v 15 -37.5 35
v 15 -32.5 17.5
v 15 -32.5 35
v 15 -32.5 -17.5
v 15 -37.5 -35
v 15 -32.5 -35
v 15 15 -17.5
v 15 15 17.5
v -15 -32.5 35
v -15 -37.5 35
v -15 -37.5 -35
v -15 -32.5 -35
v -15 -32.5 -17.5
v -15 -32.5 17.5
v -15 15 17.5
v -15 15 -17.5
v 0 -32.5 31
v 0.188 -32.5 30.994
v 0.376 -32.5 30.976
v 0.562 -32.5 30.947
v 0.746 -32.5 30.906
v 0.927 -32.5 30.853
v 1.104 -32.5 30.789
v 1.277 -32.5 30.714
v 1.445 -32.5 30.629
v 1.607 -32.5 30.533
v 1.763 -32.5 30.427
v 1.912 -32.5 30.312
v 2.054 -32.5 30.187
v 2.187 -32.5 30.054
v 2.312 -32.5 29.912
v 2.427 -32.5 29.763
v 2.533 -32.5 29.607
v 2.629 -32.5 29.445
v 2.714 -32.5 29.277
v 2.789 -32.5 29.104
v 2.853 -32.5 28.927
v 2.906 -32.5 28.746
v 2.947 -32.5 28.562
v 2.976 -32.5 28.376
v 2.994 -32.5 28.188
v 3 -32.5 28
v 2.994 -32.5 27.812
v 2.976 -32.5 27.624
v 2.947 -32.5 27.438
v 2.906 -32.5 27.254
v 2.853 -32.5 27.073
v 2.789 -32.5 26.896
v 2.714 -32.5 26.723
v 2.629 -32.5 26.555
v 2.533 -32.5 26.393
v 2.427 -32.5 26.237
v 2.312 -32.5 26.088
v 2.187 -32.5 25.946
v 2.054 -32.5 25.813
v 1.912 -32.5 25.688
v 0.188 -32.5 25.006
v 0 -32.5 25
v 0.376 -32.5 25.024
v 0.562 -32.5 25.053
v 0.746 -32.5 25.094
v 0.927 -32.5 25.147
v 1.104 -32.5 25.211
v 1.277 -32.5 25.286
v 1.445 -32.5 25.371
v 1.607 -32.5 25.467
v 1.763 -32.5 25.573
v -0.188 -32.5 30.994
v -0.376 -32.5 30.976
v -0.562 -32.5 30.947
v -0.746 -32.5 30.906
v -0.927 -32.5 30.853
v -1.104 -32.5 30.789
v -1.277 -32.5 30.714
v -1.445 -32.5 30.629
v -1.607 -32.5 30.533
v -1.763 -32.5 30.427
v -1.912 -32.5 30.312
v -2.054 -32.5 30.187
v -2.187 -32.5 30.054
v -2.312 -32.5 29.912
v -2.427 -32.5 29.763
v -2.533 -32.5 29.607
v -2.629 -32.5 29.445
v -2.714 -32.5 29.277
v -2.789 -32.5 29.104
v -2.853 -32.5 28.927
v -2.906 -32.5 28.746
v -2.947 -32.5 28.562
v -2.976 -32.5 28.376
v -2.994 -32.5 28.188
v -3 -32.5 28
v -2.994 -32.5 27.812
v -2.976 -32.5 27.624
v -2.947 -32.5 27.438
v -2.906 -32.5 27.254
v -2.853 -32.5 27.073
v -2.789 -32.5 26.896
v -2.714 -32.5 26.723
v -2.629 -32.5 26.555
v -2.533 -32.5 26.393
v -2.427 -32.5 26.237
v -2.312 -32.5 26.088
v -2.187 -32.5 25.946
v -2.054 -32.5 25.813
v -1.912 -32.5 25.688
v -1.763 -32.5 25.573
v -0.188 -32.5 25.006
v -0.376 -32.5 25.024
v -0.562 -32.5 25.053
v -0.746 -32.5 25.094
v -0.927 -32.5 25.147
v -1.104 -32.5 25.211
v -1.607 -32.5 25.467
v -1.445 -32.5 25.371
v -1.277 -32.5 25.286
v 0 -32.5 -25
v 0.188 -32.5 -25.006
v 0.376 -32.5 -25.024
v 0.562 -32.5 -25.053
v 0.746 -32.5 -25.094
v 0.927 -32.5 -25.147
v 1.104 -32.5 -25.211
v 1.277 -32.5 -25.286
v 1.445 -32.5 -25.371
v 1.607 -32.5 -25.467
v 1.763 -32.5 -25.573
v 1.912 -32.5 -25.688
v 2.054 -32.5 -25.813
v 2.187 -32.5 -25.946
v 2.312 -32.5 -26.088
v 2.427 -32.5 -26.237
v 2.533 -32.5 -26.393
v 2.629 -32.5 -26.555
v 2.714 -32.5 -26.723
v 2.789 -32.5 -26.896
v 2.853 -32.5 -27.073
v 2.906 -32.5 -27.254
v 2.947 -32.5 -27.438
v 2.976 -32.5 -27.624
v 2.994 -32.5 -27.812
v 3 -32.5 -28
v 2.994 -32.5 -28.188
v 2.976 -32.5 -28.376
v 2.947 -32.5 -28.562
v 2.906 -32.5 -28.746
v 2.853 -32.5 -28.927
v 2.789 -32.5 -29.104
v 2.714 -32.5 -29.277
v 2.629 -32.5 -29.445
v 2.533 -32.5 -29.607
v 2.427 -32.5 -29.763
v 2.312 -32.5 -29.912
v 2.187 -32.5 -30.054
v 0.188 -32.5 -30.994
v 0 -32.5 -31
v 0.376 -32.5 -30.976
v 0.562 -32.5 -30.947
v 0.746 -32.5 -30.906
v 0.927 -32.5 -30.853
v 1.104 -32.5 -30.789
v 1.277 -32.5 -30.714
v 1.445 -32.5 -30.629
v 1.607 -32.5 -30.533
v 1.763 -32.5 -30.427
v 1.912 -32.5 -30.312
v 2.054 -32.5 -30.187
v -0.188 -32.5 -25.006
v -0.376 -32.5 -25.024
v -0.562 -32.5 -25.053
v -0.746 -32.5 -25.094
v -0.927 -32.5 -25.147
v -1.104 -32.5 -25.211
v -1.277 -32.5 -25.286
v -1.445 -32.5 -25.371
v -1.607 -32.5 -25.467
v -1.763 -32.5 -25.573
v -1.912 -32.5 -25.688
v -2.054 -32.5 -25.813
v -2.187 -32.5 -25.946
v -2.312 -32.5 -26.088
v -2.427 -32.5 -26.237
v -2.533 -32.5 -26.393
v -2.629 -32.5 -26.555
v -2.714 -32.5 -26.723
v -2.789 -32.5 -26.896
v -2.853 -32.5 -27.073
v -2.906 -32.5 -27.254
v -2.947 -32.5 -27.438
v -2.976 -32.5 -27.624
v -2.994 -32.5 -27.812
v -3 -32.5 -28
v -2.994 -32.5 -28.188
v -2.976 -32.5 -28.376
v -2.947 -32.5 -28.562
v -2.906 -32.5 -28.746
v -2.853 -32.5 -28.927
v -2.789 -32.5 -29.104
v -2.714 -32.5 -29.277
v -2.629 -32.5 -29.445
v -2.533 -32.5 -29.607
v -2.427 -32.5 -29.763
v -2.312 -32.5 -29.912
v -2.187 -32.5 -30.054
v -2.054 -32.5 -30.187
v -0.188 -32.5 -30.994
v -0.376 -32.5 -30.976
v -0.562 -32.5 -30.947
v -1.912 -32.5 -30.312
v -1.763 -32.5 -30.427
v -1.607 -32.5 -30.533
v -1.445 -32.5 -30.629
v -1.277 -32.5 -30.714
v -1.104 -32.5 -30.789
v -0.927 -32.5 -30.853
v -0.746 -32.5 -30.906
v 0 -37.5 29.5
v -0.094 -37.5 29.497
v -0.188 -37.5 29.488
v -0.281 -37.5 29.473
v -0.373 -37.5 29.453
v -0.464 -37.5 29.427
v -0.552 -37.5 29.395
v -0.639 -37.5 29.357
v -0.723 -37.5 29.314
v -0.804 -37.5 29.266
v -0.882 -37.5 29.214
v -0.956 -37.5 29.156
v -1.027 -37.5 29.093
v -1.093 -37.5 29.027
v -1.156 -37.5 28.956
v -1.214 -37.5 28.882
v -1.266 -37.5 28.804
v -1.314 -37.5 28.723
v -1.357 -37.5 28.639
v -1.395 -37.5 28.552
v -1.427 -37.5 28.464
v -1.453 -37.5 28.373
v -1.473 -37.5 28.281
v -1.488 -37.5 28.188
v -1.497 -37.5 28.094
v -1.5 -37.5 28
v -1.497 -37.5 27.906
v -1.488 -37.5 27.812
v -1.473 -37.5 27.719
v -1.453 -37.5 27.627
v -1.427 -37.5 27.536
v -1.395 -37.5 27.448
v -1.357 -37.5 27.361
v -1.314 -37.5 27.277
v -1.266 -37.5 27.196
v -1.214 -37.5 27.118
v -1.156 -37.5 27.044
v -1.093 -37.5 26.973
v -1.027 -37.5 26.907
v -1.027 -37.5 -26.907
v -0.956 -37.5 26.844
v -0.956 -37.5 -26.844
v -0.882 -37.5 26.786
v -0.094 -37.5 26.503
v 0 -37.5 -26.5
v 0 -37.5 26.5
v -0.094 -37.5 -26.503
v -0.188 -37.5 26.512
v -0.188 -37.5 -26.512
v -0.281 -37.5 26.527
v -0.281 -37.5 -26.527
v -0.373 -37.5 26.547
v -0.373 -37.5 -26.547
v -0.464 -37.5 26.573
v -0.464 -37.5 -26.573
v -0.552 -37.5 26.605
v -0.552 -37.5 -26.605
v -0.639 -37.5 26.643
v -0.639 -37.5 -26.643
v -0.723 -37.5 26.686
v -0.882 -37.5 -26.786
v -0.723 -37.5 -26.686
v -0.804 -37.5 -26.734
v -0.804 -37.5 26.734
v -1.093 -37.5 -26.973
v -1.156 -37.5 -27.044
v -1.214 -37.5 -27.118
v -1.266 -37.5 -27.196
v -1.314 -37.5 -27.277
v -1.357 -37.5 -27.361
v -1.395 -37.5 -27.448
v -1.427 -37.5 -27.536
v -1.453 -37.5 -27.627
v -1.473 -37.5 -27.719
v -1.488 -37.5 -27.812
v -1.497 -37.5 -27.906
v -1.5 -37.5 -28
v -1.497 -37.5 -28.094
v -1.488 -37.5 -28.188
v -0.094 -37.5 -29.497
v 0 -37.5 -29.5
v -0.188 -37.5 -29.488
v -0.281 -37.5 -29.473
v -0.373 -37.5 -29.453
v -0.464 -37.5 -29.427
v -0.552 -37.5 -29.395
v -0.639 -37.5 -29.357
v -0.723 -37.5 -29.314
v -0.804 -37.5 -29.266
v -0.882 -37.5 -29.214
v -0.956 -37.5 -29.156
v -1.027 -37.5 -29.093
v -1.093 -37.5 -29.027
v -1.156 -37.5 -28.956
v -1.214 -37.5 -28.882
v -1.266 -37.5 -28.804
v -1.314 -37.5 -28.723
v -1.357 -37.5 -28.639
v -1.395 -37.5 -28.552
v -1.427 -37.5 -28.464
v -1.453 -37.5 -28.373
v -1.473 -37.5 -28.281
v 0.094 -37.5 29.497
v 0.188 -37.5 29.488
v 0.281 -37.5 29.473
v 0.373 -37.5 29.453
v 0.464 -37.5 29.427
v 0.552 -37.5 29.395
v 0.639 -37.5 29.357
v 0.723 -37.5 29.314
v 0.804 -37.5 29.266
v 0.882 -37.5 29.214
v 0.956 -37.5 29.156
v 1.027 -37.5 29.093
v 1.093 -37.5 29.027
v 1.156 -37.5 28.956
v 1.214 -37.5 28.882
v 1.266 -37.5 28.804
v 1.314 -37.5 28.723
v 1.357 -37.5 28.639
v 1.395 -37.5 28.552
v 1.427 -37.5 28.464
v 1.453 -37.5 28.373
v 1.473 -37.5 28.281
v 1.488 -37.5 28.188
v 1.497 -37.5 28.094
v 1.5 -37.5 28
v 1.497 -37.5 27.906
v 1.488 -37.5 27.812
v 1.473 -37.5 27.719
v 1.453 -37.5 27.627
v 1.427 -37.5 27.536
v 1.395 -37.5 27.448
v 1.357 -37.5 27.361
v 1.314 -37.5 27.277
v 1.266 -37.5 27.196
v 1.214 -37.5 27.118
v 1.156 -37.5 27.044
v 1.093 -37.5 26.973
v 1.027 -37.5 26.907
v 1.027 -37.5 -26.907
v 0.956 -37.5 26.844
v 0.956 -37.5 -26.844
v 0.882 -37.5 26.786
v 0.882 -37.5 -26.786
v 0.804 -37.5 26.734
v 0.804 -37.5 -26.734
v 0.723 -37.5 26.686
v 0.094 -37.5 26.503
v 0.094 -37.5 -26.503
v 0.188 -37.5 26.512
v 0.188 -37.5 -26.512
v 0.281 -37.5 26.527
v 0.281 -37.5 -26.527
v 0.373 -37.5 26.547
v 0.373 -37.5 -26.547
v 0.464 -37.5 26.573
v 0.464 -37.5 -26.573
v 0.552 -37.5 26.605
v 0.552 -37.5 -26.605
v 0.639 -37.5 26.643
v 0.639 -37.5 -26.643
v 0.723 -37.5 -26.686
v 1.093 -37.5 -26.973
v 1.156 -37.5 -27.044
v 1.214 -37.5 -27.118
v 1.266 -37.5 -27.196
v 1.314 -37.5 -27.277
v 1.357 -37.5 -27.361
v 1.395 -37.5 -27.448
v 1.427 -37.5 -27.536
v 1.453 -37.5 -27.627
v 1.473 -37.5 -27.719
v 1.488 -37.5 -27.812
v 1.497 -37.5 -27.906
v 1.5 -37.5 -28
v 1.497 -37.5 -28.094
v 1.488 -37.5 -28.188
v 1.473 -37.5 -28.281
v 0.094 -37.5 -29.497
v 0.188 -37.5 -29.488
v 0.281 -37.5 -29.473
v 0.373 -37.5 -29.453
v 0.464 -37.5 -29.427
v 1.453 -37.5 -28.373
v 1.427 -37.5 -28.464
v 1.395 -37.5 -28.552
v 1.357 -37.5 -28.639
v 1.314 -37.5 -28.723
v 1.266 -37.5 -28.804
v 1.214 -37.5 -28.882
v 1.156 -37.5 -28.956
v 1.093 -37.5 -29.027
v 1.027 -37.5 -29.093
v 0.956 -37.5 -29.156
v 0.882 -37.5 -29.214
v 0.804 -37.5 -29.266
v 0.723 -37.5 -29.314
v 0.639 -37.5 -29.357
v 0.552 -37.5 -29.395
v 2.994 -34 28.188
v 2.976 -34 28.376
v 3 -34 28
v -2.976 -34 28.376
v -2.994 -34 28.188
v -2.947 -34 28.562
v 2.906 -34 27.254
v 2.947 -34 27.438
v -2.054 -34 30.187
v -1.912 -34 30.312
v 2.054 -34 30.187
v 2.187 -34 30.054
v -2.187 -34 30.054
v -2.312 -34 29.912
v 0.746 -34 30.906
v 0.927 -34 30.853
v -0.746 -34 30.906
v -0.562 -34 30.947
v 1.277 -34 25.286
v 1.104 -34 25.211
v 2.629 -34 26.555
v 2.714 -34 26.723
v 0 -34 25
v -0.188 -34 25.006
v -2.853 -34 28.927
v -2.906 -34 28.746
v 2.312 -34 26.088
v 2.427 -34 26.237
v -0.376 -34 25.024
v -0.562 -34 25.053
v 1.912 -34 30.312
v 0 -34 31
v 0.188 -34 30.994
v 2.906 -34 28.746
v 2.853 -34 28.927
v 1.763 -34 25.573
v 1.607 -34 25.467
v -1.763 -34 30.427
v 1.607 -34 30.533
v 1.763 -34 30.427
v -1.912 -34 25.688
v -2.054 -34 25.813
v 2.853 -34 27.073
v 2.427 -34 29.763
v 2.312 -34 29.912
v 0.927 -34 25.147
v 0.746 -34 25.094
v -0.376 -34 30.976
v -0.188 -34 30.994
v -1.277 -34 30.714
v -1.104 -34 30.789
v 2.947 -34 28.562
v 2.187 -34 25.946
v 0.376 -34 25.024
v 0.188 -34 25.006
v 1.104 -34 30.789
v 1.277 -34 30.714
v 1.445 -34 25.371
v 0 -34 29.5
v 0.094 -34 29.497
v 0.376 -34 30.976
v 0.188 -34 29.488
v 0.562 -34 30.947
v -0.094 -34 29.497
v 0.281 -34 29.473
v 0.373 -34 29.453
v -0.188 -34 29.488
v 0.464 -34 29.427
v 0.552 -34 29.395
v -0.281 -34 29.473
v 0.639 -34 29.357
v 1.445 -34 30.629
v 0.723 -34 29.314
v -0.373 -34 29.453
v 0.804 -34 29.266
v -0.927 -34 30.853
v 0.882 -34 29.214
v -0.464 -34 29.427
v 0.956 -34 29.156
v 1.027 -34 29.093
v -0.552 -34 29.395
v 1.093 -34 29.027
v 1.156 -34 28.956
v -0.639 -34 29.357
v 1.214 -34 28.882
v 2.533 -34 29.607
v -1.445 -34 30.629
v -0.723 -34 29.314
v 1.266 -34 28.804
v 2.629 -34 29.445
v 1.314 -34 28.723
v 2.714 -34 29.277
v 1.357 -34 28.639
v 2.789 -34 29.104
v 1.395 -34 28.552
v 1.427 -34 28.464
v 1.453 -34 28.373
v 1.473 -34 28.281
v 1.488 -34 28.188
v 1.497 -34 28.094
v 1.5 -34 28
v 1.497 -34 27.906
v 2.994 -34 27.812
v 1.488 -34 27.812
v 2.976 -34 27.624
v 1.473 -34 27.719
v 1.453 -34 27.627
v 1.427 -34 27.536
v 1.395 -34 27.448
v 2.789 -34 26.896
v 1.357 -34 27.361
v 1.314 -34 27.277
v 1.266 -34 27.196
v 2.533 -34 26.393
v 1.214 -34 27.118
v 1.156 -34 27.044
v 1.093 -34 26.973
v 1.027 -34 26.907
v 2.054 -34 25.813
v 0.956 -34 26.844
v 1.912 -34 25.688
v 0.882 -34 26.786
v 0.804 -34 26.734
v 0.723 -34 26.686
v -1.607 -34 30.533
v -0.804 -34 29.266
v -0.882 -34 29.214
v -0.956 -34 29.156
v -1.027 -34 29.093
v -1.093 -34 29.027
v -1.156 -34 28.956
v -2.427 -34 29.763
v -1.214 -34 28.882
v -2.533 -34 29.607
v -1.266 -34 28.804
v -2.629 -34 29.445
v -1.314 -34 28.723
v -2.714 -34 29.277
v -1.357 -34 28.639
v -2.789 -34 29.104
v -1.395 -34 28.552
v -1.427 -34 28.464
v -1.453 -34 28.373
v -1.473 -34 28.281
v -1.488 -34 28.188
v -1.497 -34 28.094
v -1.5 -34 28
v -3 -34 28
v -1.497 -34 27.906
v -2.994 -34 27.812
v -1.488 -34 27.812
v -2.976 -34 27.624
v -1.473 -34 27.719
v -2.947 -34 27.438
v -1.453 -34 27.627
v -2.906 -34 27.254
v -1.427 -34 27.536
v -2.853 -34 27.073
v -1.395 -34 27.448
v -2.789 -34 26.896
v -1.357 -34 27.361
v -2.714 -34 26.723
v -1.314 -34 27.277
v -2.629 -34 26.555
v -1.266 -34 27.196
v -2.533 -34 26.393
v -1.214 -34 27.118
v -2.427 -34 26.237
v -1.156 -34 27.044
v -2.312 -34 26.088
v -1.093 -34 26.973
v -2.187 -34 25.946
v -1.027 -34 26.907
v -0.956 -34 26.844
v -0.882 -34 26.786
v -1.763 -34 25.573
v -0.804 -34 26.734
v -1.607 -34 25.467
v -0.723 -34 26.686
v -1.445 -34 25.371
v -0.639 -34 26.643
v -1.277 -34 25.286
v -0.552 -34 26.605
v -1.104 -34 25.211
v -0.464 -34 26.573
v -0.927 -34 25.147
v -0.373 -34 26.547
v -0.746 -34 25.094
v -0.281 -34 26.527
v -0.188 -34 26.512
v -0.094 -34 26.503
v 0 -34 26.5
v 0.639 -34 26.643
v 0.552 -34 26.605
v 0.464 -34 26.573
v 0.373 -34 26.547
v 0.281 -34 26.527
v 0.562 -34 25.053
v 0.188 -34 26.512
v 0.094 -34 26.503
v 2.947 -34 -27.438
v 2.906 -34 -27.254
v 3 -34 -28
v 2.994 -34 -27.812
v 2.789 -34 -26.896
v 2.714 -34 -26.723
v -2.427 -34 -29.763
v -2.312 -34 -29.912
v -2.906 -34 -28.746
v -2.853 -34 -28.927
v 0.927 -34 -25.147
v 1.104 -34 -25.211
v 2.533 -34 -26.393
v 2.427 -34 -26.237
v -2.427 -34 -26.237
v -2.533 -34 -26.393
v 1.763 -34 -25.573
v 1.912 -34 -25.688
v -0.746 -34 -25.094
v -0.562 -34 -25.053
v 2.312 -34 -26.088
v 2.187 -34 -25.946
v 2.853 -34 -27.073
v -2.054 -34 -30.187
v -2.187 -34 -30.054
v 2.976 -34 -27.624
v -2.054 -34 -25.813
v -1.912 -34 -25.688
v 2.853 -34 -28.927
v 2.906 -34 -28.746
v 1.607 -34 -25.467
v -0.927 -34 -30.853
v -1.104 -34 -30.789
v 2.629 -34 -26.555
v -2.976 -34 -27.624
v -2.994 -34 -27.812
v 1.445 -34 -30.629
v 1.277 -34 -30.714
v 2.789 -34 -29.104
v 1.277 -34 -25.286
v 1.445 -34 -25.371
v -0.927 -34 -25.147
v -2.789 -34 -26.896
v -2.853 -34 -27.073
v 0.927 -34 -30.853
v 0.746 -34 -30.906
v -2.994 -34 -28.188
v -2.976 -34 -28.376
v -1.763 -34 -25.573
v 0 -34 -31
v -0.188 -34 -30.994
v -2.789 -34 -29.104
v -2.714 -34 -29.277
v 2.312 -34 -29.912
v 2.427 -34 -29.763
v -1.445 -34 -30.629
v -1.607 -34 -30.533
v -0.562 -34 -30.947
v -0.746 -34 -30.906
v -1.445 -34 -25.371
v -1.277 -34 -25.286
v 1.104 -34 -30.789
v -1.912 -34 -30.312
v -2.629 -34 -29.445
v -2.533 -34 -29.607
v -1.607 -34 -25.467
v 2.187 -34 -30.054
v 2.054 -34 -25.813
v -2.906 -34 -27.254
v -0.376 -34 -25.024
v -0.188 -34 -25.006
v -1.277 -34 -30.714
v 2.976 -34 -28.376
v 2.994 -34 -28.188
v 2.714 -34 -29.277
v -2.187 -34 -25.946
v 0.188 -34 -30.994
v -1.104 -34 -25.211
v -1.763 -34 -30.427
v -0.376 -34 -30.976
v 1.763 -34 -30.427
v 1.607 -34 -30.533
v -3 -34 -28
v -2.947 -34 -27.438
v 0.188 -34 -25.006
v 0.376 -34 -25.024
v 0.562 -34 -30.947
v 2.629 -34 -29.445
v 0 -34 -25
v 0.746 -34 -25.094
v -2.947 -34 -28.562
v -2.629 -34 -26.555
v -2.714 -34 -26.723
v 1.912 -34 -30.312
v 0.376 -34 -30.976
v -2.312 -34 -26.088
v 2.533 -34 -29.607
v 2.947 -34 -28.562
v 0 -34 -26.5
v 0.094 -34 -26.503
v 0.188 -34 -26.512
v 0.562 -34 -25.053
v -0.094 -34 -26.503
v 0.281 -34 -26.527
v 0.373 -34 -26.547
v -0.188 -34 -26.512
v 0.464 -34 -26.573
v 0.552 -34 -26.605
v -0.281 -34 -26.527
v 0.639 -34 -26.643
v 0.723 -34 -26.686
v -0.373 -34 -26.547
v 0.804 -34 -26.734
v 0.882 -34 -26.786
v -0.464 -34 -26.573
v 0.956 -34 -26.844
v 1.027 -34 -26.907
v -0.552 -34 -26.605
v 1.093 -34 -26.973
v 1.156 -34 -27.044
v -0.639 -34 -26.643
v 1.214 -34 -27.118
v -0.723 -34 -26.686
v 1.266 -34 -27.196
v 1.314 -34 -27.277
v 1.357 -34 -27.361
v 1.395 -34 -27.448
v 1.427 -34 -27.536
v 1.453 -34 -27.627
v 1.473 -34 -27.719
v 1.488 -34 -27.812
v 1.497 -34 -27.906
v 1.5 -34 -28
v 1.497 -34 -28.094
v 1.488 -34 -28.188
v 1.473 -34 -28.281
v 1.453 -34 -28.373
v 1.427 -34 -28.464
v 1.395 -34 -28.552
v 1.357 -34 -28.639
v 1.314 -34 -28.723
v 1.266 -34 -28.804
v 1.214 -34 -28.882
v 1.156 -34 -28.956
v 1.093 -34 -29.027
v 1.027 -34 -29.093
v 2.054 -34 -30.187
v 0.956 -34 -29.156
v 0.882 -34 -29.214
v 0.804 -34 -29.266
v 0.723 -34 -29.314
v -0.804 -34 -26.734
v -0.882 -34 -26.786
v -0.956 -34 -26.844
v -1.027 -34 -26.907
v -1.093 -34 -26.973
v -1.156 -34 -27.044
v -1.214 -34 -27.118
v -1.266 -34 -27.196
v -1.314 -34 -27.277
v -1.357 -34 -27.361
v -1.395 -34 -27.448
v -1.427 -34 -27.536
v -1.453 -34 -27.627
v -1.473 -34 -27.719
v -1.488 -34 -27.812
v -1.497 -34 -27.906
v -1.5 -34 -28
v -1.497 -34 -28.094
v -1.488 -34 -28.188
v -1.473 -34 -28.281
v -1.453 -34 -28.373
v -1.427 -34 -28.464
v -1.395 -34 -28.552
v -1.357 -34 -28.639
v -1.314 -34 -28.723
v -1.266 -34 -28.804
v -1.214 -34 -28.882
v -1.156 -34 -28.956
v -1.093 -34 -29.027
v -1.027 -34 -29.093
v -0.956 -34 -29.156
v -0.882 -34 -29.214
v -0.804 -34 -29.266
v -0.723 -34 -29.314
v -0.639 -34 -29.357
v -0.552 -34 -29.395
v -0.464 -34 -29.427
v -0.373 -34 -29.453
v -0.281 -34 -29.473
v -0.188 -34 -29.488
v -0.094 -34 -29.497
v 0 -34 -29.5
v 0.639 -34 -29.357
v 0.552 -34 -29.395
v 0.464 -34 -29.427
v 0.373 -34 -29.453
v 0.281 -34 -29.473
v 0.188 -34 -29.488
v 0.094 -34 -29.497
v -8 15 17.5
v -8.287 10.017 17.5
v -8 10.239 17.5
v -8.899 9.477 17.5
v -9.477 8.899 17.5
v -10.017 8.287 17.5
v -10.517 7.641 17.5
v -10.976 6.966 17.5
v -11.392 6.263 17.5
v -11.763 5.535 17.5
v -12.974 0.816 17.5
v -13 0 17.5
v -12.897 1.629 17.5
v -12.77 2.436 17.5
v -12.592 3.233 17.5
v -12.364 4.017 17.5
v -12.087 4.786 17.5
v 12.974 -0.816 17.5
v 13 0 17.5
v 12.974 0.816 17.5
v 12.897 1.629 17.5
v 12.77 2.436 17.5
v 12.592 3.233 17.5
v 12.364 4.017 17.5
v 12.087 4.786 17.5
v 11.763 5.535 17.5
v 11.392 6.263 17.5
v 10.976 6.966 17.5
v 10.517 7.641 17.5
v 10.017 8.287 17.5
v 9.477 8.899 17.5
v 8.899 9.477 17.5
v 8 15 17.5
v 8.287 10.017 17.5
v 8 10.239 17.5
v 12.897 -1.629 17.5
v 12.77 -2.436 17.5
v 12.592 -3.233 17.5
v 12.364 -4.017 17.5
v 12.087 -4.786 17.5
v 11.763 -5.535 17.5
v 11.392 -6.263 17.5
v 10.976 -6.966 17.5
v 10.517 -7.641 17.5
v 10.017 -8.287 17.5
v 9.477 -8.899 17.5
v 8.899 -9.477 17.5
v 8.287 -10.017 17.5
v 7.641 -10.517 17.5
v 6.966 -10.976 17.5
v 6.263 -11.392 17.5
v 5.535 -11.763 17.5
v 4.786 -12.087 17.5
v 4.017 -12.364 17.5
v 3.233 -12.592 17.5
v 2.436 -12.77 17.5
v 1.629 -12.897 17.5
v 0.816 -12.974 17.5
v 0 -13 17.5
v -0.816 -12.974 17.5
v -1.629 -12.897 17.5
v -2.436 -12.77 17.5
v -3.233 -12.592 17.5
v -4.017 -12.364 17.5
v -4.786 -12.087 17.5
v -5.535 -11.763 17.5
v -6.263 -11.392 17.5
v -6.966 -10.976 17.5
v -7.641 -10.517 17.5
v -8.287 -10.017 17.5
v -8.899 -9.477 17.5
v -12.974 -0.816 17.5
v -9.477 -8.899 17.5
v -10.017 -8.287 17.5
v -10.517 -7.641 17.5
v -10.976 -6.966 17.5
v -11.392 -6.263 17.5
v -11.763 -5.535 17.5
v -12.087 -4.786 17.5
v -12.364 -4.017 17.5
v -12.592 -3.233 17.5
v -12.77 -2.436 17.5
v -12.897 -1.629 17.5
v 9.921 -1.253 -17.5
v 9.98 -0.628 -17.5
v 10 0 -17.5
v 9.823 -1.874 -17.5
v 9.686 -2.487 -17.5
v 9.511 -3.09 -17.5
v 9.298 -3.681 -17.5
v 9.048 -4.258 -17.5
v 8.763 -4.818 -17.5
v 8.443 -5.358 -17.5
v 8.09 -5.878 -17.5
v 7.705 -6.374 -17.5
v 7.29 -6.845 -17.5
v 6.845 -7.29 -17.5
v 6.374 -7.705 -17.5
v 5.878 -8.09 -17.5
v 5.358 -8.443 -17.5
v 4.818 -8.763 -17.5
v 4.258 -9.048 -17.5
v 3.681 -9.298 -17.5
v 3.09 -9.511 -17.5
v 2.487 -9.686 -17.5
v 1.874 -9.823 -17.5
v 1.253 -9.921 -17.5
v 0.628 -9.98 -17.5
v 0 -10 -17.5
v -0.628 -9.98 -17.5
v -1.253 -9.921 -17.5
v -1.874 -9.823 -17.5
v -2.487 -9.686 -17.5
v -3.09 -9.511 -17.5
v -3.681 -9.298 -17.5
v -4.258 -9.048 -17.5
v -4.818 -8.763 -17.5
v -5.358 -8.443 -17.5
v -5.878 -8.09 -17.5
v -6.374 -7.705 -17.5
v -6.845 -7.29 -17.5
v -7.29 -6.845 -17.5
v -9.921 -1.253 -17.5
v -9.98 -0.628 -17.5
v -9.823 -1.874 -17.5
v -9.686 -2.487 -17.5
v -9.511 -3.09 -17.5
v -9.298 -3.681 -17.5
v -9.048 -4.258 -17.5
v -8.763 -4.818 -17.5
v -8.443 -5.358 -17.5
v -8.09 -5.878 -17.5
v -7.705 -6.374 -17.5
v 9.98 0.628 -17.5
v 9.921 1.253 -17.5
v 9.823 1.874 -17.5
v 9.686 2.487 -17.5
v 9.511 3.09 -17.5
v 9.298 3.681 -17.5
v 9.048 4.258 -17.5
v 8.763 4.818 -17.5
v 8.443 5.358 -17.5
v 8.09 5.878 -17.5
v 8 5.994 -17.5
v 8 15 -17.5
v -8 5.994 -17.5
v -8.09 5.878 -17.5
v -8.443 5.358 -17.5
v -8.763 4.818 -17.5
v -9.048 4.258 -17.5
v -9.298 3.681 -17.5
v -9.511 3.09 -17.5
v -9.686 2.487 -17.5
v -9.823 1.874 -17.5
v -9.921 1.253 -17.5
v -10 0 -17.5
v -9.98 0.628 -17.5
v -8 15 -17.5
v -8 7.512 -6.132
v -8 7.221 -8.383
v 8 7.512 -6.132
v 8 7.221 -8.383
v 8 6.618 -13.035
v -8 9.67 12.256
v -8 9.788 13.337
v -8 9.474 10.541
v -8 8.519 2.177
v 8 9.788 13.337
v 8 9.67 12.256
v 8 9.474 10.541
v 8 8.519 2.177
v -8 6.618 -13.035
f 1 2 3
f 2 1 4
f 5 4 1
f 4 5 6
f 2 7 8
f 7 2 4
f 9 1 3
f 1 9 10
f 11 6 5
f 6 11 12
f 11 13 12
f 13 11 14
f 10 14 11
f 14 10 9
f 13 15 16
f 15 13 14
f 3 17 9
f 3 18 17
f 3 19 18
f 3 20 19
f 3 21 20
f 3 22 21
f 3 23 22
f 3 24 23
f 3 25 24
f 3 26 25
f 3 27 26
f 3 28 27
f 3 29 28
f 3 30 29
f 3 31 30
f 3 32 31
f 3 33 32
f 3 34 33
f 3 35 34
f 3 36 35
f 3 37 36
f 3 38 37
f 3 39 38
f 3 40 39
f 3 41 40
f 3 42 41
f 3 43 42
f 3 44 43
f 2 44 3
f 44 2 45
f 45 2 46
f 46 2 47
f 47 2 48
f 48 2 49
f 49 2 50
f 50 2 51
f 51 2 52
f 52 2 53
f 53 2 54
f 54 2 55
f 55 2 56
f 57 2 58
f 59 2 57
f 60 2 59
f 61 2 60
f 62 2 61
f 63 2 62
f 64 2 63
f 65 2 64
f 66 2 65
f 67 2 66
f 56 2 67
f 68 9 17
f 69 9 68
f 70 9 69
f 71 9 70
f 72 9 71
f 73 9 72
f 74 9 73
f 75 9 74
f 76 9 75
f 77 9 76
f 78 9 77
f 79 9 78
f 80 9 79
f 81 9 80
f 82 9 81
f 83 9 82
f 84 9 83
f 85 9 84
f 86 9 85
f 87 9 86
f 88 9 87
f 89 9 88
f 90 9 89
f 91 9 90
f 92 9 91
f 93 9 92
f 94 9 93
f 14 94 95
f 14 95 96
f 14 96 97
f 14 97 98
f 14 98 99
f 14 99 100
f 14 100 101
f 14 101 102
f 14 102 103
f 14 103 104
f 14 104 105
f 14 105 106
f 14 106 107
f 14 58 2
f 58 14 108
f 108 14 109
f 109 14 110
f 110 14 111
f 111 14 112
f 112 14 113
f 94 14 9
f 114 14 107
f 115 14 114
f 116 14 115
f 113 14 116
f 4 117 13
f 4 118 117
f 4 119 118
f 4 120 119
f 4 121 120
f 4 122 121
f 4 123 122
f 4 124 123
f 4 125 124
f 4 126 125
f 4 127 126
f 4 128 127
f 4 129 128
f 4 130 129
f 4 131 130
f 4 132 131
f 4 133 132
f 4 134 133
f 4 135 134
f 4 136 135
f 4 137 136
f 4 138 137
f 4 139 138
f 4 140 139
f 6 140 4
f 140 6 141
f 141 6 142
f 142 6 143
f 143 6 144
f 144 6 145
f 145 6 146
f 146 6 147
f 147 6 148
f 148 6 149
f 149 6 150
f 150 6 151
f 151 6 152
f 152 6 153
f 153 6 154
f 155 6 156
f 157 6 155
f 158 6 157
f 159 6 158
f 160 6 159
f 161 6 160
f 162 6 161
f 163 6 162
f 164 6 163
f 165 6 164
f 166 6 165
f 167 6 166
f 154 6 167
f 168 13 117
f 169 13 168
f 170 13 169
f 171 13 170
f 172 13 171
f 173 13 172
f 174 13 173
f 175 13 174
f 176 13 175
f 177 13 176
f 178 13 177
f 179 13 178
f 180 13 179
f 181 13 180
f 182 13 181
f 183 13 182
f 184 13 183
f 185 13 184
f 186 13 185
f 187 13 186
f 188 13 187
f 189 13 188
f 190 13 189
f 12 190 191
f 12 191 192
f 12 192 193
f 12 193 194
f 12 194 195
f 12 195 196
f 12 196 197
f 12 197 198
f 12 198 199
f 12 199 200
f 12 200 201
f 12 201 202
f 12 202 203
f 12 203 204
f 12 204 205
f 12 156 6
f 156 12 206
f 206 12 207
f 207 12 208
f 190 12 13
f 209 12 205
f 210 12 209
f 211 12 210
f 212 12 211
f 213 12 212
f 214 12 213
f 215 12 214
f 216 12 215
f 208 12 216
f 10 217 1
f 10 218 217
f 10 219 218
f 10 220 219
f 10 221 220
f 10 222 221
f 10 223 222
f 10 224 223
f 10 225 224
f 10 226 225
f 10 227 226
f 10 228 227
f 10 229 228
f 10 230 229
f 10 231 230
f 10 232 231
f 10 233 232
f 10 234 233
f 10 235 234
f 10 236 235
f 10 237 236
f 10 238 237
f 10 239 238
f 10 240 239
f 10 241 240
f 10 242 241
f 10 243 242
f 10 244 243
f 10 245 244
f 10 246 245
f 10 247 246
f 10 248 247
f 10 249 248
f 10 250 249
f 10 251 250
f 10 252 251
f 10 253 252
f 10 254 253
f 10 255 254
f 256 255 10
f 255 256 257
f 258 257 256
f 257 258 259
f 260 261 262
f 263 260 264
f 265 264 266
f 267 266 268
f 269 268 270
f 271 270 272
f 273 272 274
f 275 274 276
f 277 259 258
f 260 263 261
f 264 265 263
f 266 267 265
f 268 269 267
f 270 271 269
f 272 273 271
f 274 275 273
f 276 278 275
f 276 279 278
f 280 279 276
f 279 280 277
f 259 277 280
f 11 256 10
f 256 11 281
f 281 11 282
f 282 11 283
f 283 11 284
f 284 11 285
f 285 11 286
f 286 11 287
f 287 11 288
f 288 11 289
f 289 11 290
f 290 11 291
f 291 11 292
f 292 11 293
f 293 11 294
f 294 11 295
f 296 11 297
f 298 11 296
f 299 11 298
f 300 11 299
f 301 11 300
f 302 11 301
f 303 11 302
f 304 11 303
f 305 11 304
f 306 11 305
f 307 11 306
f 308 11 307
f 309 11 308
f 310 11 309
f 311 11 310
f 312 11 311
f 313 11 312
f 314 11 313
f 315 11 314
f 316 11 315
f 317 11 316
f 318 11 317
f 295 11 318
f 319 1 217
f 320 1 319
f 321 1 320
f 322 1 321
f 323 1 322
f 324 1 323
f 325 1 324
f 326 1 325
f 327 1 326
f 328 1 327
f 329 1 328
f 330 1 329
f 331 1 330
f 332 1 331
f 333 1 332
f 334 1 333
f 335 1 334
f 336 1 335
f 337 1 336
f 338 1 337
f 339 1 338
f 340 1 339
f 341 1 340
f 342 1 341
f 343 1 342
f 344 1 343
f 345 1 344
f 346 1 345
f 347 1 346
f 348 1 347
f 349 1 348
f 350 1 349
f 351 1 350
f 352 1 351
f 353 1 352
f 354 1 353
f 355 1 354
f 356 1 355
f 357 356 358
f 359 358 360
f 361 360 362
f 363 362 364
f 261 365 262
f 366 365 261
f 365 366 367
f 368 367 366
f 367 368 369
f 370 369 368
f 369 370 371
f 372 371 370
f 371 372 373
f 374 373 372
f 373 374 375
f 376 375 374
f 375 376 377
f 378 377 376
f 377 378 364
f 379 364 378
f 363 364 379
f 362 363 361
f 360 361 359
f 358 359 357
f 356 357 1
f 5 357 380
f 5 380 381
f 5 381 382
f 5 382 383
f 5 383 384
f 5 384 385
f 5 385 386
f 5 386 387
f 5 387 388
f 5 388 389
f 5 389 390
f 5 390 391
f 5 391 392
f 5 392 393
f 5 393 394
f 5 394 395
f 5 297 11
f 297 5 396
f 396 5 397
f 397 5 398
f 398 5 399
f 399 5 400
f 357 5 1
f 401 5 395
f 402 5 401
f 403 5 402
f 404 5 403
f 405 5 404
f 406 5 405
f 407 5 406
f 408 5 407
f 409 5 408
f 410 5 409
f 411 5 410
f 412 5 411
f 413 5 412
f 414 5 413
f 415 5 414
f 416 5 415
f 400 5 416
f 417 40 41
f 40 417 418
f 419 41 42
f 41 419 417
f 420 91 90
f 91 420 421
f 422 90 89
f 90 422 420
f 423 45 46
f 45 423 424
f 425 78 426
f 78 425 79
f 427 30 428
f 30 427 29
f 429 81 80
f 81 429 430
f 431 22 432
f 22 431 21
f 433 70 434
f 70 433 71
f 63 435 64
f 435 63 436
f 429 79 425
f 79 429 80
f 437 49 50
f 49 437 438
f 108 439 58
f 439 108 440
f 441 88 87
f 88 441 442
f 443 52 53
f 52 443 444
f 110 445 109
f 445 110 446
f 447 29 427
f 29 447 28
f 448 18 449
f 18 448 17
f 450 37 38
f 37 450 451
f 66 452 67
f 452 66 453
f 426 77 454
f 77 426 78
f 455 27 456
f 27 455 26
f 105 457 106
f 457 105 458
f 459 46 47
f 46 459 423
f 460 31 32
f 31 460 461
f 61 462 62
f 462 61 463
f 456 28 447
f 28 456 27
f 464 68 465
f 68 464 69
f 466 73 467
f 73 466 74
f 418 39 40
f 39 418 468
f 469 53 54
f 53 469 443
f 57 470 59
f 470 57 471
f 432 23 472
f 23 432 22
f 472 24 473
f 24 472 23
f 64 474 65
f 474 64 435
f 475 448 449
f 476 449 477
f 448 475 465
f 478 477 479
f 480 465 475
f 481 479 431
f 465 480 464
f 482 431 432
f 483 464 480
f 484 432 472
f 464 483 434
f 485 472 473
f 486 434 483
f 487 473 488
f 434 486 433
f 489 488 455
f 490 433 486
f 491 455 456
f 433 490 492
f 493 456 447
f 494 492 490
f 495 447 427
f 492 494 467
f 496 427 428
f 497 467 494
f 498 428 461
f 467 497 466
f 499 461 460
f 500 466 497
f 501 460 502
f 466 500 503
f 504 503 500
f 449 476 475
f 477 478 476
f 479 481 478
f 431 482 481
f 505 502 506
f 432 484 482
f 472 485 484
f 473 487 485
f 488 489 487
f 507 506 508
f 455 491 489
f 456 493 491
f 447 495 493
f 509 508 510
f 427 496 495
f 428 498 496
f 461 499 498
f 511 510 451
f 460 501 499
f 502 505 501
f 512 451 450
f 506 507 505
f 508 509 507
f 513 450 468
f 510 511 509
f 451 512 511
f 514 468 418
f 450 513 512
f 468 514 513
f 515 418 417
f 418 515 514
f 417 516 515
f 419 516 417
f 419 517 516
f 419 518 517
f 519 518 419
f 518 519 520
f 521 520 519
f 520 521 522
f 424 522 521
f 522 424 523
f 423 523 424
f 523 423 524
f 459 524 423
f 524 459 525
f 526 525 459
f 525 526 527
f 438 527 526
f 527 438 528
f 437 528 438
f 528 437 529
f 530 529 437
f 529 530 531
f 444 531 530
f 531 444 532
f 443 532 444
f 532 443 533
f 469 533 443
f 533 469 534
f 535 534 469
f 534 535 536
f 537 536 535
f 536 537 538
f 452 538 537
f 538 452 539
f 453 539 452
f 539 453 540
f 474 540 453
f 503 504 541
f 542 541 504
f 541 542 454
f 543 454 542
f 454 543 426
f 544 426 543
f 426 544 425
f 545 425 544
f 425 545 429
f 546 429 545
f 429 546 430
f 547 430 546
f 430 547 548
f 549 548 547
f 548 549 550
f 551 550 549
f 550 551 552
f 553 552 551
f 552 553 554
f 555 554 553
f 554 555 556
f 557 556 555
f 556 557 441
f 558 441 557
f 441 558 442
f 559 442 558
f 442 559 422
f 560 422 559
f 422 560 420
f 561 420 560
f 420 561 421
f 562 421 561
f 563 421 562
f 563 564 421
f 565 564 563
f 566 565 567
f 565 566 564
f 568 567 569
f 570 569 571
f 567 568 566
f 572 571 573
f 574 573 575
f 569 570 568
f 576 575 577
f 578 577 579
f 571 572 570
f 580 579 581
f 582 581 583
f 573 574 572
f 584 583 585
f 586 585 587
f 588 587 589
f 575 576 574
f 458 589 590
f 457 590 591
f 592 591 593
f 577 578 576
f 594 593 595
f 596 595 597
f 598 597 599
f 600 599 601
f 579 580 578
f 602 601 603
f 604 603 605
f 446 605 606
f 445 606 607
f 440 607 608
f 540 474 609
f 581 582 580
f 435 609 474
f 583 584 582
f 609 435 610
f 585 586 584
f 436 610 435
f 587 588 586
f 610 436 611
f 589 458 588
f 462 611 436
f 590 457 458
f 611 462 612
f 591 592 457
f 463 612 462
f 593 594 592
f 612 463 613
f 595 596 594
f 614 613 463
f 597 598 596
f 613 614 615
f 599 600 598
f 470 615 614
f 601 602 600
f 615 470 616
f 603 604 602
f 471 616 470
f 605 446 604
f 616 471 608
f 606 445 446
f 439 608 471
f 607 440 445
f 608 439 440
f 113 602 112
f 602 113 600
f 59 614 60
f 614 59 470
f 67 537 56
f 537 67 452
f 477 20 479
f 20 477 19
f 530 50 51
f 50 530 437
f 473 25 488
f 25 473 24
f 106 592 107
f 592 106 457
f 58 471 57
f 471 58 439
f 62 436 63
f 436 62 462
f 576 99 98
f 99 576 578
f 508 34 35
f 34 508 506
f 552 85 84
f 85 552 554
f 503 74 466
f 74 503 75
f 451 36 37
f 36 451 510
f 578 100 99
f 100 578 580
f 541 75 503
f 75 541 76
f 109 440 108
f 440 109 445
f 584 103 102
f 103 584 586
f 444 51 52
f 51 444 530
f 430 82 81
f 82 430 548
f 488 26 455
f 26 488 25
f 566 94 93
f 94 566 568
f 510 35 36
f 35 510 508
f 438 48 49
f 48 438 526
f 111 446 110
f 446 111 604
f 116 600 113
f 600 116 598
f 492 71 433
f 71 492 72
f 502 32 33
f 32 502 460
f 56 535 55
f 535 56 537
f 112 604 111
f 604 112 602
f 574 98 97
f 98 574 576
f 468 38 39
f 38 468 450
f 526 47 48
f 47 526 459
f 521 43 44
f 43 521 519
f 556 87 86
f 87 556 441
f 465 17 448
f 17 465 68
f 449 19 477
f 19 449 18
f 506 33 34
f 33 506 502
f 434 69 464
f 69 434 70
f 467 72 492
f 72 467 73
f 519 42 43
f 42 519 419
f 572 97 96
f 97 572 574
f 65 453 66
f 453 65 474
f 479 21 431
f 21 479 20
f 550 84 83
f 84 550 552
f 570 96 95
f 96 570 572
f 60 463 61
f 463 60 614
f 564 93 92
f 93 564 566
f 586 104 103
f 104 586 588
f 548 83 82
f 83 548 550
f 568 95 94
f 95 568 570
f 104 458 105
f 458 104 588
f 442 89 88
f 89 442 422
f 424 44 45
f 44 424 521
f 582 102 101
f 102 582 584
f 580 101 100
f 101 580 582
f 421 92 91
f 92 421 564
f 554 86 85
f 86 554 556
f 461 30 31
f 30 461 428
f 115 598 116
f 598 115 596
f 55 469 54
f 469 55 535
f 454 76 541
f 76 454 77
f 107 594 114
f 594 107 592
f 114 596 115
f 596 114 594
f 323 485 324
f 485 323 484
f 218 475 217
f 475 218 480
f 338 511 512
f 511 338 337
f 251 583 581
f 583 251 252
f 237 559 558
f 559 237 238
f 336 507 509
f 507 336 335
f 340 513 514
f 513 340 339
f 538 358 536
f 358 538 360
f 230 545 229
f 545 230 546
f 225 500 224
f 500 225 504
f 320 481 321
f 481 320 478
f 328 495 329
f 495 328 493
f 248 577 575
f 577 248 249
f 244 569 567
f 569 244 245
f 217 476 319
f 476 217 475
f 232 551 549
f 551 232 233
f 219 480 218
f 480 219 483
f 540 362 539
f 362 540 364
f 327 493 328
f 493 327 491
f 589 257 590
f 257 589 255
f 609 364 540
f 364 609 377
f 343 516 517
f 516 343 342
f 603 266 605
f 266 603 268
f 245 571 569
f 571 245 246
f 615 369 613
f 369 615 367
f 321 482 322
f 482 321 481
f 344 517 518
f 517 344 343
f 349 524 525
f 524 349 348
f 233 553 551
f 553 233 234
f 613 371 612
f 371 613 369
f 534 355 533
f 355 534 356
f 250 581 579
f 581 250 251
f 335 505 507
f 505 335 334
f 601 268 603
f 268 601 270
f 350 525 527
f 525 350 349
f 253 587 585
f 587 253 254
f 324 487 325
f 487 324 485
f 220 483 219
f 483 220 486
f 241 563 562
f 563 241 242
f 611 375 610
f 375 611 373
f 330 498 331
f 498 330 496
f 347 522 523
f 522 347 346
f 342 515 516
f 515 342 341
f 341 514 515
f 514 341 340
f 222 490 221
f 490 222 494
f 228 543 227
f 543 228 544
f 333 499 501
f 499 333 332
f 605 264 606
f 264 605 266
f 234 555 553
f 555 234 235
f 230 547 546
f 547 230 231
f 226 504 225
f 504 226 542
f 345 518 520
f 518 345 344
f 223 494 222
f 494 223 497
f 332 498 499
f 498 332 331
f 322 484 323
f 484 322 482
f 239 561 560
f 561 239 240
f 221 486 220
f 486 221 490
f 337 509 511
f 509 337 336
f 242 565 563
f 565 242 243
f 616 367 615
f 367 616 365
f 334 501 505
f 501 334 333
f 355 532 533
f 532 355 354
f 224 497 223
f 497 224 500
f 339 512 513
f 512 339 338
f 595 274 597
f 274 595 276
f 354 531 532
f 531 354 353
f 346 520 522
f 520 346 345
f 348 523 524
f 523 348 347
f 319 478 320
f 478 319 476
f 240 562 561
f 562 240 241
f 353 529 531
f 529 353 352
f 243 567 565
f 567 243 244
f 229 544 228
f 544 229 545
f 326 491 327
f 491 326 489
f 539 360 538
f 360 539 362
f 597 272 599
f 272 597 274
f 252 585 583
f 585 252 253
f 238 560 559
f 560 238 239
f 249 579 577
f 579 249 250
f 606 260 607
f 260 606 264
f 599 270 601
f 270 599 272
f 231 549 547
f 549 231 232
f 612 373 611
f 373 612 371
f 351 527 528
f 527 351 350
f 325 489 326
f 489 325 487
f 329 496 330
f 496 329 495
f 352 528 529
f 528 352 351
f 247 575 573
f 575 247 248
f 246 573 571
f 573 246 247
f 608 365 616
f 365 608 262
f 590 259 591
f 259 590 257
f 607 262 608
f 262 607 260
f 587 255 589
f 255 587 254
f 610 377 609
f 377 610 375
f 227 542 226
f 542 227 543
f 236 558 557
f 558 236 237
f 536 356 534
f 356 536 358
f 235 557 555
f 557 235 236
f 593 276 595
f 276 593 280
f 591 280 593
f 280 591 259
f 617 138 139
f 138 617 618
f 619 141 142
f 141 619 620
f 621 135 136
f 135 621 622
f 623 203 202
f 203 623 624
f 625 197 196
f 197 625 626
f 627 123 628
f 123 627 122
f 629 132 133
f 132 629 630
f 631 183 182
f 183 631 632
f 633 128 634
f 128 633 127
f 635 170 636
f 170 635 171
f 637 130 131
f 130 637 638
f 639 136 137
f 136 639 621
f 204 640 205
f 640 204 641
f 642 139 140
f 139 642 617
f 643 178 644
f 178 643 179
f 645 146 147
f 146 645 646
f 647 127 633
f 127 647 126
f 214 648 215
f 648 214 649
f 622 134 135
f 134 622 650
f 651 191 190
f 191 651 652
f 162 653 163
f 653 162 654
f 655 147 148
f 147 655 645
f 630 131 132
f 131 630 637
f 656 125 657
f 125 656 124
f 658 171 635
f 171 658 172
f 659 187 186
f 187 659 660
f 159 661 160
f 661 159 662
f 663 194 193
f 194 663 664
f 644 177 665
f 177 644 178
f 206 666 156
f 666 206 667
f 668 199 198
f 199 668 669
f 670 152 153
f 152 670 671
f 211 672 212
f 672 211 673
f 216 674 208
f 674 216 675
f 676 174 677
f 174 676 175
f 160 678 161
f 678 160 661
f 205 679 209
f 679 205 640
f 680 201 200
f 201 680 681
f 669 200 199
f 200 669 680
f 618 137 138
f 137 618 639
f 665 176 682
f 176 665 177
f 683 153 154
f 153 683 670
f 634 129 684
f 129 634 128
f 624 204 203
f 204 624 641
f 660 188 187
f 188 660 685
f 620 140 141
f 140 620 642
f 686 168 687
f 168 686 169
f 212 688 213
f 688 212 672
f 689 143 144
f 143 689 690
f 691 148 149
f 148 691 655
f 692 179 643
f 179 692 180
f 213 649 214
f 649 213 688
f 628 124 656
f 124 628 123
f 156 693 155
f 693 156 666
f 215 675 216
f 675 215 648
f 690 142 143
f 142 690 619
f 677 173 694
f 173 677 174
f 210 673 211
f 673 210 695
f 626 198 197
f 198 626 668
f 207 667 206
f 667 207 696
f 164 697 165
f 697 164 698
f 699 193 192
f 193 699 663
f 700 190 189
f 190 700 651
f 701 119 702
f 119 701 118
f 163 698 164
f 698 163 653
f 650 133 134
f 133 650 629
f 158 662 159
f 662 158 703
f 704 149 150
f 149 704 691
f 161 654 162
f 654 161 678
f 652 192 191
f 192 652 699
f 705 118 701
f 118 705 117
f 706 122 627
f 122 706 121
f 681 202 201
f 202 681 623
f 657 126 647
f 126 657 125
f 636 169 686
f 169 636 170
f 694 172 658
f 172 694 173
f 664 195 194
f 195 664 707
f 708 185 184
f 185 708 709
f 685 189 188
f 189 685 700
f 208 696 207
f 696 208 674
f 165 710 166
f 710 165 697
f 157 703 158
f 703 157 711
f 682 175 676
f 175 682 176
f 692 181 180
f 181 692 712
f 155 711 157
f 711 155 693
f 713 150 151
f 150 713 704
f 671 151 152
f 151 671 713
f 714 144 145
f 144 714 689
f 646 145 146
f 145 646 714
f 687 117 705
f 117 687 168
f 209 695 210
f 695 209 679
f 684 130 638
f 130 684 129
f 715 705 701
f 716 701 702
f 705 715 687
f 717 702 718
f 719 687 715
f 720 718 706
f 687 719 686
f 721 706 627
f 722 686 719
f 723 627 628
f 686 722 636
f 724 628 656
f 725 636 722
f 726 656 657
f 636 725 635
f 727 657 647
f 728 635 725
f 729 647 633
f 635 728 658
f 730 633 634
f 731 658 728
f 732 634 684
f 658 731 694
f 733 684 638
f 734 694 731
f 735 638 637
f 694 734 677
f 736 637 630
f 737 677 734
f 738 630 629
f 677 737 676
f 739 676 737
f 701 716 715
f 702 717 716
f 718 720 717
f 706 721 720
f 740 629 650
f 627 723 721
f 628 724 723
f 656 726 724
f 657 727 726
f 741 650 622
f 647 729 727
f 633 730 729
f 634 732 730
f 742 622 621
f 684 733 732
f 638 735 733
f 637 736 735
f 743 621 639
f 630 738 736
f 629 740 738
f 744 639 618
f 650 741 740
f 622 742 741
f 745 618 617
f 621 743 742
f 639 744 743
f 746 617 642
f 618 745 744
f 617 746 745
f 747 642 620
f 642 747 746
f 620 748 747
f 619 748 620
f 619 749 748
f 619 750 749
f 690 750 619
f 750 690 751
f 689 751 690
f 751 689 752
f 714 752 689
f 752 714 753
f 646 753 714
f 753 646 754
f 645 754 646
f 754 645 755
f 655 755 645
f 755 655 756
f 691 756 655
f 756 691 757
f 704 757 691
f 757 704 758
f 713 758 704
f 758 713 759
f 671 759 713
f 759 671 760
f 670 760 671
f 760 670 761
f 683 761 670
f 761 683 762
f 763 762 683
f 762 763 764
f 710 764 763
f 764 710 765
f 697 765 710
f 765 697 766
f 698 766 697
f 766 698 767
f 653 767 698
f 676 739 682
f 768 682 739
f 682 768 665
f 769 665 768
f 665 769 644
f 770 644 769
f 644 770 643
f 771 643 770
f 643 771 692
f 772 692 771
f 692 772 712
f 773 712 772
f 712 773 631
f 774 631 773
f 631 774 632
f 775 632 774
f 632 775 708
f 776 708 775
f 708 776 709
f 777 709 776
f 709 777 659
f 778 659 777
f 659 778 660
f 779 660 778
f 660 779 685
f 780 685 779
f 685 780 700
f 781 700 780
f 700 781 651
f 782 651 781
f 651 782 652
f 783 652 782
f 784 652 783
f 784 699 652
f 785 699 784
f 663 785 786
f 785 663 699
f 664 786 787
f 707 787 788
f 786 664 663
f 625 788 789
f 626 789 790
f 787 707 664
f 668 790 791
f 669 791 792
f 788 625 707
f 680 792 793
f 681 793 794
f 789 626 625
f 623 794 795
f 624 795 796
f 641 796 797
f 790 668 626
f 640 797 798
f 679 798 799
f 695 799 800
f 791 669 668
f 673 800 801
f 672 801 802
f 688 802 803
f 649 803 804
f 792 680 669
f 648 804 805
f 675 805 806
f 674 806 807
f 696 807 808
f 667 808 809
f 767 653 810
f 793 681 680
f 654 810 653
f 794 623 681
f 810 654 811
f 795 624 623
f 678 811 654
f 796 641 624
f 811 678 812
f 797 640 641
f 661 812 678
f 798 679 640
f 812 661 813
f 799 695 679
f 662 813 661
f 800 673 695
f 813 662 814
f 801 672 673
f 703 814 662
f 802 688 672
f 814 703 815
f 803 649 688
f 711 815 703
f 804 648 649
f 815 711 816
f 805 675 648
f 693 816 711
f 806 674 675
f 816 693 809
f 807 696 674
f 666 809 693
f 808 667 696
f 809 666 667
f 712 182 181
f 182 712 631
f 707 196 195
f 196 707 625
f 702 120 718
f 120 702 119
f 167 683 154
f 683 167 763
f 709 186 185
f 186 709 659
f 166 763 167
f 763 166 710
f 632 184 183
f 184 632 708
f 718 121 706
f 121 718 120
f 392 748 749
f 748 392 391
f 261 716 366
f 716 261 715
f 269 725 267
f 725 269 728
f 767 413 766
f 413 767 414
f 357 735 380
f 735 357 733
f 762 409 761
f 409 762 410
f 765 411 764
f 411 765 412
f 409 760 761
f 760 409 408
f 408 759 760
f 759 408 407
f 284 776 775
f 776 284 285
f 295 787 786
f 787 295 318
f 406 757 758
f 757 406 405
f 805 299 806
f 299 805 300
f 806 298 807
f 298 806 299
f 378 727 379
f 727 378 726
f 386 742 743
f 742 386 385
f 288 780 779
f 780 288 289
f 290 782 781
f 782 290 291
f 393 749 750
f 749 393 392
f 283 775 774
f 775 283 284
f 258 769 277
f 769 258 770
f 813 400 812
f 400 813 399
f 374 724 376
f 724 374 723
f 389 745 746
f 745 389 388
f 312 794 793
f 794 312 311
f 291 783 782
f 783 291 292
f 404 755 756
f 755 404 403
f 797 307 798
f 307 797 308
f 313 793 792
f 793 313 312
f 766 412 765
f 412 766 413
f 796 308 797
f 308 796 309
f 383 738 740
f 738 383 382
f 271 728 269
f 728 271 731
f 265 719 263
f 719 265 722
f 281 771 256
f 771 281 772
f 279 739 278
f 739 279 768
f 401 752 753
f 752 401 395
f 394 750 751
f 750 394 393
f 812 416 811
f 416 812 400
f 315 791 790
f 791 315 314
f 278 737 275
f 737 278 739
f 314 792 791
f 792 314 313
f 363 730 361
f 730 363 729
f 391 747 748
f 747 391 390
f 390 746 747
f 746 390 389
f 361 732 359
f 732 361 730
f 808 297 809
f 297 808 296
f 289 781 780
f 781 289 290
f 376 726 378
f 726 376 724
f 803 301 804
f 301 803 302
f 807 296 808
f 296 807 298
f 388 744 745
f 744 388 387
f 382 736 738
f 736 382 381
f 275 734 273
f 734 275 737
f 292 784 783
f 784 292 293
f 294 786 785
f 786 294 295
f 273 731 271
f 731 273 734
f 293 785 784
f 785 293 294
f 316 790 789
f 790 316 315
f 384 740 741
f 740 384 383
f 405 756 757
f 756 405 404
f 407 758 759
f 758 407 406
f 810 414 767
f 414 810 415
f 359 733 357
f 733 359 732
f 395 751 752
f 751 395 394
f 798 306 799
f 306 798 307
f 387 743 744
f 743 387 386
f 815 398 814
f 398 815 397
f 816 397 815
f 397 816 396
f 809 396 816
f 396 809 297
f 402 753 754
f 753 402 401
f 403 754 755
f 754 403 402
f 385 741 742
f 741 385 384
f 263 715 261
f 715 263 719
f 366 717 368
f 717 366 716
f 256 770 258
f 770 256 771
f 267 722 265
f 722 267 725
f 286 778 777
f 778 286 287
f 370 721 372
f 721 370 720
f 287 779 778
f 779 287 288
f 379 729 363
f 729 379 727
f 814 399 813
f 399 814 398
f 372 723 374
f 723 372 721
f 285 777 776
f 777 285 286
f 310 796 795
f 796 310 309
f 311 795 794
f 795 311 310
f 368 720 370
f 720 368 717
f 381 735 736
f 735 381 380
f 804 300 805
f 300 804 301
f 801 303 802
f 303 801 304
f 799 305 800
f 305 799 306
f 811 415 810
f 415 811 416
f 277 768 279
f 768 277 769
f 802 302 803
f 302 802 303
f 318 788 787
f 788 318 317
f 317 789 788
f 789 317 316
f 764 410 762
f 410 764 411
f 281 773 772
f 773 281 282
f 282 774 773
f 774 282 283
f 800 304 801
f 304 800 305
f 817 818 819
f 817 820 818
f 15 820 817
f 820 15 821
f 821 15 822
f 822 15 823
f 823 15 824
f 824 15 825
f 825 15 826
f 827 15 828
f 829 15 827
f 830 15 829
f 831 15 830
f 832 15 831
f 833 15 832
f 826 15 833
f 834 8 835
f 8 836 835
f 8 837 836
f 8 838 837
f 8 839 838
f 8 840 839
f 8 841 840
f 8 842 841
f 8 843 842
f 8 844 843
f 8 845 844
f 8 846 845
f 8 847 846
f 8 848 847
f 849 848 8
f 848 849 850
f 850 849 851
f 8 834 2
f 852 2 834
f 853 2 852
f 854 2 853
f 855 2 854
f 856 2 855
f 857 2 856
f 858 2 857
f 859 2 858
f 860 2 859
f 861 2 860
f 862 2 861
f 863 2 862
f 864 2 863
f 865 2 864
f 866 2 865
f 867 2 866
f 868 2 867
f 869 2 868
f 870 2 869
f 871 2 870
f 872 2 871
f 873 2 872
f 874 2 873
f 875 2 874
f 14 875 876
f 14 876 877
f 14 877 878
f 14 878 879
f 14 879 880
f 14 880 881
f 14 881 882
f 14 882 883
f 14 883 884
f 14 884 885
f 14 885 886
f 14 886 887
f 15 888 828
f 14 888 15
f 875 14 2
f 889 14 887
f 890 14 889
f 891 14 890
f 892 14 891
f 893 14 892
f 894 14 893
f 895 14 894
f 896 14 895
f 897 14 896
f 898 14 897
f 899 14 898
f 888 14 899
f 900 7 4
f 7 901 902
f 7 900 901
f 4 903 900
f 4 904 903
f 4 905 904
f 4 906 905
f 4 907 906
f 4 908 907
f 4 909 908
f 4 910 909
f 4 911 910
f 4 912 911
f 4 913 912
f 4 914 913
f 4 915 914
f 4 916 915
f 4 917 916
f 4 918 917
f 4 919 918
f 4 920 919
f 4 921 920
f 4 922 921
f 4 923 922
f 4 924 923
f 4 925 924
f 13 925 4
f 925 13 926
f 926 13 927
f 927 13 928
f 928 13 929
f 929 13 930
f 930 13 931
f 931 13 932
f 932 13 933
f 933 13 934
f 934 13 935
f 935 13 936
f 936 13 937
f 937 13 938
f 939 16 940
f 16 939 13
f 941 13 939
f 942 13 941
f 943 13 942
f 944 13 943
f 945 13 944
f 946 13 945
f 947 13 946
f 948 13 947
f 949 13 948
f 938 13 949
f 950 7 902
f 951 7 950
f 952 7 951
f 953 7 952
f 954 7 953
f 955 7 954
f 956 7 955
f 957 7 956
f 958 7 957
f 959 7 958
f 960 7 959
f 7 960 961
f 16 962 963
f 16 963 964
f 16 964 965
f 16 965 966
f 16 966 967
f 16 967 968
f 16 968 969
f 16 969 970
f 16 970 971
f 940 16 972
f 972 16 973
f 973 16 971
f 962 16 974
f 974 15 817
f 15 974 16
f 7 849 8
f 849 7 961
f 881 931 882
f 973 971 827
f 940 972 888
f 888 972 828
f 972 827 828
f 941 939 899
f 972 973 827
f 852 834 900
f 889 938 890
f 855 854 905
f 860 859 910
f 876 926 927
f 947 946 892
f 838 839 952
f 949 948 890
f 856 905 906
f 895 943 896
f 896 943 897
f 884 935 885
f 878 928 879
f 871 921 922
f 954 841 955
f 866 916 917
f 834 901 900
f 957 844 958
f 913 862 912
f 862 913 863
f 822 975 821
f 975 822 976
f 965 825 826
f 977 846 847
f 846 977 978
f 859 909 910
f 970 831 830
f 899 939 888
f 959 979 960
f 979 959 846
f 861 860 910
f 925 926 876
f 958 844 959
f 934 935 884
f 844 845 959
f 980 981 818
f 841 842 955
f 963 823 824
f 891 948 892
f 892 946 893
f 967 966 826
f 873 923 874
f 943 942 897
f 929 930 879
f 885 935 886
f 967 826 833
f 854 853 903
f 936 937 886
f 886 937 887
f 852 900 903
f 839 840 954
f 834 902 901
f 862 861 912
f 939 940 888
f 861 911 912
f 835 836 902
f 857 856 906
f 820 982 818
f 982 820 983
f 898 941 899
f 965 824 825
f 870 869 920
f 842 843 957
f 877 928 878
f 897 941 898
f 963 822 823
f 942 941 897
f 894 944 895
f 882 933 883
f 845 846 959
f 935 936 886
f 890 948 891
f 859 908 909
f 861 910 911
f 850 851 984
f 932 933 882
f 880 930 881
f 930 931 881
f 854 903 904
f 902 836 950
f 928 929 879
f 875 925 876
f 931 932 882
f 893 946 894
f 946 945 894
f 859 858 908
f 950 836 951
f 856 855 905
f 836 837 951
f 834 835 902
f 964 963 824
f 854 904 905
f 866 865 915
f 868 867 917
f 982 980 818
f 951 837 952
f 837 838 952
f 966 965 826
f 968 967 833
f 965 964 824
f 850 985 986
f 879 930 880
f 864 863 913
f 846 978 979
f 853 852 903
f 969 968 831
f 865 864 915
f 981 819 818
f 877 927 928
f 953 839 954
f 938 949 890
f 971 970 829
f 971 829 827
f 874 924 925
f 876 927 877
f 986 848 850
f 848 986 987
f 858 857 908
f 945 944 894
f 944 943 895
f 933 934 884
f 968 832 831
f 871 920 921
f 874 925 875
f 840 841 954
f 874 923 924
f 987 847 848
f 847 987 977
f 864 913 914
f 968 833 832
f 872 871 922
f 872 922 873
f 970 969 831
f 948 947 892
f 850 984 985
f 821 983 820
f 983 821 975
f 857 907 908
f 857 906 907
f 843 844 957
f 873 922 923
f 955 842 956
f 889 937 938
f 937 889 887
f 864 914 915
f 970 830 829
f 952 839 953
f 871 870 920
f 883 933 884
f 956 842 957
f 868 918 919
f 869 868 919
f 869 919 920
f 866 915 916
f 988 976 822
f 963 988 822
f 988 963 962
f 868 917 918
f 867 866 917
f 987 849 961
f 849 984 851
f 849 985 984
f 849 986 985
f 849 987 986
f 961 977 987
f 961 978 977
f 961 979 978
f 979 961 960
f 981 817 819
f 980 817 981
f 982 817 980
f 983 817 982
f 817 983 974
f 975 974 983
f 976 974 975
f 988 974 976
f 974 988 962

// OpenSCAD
$fn=100;
module Front()
{
	difference()
	{
		cube([30,30,35],center=true);
		rotate([0,180,0])linear_extrude(height = 35, twist =0, scale = 20/26, center = true)circle(r=13);
		translate([0,50,0])cube([16,100,35],center=true);
	}
}

module Back(){
	difference()
	{
		cube([30,5,70],center=true);
		translate([0,2,28])rotate([90,00,0])cylinder(h=2,r=3,,center=true);
		translate([0,0,28])rotate([90,00,0])cylinder(h=100,r=1.5,,center=true);
		translate([0,2,-28])rotate([90,00,0])cylinder(h=2,r=3,,center=true);
		translate([0,0,-28])rotate([90,00,0])cylinder(h=100,r=1.5,,center=true);
	}
}

union()
{
	translate([0,-35.,0])Back();
	translate([0,-25,0])cube([30,20,35],center=true);
	Front();
}

//23
//9
//gap:16


//rotate([0,10,0])
/*
union(){
	cube([20,10,30]);
}
// */
